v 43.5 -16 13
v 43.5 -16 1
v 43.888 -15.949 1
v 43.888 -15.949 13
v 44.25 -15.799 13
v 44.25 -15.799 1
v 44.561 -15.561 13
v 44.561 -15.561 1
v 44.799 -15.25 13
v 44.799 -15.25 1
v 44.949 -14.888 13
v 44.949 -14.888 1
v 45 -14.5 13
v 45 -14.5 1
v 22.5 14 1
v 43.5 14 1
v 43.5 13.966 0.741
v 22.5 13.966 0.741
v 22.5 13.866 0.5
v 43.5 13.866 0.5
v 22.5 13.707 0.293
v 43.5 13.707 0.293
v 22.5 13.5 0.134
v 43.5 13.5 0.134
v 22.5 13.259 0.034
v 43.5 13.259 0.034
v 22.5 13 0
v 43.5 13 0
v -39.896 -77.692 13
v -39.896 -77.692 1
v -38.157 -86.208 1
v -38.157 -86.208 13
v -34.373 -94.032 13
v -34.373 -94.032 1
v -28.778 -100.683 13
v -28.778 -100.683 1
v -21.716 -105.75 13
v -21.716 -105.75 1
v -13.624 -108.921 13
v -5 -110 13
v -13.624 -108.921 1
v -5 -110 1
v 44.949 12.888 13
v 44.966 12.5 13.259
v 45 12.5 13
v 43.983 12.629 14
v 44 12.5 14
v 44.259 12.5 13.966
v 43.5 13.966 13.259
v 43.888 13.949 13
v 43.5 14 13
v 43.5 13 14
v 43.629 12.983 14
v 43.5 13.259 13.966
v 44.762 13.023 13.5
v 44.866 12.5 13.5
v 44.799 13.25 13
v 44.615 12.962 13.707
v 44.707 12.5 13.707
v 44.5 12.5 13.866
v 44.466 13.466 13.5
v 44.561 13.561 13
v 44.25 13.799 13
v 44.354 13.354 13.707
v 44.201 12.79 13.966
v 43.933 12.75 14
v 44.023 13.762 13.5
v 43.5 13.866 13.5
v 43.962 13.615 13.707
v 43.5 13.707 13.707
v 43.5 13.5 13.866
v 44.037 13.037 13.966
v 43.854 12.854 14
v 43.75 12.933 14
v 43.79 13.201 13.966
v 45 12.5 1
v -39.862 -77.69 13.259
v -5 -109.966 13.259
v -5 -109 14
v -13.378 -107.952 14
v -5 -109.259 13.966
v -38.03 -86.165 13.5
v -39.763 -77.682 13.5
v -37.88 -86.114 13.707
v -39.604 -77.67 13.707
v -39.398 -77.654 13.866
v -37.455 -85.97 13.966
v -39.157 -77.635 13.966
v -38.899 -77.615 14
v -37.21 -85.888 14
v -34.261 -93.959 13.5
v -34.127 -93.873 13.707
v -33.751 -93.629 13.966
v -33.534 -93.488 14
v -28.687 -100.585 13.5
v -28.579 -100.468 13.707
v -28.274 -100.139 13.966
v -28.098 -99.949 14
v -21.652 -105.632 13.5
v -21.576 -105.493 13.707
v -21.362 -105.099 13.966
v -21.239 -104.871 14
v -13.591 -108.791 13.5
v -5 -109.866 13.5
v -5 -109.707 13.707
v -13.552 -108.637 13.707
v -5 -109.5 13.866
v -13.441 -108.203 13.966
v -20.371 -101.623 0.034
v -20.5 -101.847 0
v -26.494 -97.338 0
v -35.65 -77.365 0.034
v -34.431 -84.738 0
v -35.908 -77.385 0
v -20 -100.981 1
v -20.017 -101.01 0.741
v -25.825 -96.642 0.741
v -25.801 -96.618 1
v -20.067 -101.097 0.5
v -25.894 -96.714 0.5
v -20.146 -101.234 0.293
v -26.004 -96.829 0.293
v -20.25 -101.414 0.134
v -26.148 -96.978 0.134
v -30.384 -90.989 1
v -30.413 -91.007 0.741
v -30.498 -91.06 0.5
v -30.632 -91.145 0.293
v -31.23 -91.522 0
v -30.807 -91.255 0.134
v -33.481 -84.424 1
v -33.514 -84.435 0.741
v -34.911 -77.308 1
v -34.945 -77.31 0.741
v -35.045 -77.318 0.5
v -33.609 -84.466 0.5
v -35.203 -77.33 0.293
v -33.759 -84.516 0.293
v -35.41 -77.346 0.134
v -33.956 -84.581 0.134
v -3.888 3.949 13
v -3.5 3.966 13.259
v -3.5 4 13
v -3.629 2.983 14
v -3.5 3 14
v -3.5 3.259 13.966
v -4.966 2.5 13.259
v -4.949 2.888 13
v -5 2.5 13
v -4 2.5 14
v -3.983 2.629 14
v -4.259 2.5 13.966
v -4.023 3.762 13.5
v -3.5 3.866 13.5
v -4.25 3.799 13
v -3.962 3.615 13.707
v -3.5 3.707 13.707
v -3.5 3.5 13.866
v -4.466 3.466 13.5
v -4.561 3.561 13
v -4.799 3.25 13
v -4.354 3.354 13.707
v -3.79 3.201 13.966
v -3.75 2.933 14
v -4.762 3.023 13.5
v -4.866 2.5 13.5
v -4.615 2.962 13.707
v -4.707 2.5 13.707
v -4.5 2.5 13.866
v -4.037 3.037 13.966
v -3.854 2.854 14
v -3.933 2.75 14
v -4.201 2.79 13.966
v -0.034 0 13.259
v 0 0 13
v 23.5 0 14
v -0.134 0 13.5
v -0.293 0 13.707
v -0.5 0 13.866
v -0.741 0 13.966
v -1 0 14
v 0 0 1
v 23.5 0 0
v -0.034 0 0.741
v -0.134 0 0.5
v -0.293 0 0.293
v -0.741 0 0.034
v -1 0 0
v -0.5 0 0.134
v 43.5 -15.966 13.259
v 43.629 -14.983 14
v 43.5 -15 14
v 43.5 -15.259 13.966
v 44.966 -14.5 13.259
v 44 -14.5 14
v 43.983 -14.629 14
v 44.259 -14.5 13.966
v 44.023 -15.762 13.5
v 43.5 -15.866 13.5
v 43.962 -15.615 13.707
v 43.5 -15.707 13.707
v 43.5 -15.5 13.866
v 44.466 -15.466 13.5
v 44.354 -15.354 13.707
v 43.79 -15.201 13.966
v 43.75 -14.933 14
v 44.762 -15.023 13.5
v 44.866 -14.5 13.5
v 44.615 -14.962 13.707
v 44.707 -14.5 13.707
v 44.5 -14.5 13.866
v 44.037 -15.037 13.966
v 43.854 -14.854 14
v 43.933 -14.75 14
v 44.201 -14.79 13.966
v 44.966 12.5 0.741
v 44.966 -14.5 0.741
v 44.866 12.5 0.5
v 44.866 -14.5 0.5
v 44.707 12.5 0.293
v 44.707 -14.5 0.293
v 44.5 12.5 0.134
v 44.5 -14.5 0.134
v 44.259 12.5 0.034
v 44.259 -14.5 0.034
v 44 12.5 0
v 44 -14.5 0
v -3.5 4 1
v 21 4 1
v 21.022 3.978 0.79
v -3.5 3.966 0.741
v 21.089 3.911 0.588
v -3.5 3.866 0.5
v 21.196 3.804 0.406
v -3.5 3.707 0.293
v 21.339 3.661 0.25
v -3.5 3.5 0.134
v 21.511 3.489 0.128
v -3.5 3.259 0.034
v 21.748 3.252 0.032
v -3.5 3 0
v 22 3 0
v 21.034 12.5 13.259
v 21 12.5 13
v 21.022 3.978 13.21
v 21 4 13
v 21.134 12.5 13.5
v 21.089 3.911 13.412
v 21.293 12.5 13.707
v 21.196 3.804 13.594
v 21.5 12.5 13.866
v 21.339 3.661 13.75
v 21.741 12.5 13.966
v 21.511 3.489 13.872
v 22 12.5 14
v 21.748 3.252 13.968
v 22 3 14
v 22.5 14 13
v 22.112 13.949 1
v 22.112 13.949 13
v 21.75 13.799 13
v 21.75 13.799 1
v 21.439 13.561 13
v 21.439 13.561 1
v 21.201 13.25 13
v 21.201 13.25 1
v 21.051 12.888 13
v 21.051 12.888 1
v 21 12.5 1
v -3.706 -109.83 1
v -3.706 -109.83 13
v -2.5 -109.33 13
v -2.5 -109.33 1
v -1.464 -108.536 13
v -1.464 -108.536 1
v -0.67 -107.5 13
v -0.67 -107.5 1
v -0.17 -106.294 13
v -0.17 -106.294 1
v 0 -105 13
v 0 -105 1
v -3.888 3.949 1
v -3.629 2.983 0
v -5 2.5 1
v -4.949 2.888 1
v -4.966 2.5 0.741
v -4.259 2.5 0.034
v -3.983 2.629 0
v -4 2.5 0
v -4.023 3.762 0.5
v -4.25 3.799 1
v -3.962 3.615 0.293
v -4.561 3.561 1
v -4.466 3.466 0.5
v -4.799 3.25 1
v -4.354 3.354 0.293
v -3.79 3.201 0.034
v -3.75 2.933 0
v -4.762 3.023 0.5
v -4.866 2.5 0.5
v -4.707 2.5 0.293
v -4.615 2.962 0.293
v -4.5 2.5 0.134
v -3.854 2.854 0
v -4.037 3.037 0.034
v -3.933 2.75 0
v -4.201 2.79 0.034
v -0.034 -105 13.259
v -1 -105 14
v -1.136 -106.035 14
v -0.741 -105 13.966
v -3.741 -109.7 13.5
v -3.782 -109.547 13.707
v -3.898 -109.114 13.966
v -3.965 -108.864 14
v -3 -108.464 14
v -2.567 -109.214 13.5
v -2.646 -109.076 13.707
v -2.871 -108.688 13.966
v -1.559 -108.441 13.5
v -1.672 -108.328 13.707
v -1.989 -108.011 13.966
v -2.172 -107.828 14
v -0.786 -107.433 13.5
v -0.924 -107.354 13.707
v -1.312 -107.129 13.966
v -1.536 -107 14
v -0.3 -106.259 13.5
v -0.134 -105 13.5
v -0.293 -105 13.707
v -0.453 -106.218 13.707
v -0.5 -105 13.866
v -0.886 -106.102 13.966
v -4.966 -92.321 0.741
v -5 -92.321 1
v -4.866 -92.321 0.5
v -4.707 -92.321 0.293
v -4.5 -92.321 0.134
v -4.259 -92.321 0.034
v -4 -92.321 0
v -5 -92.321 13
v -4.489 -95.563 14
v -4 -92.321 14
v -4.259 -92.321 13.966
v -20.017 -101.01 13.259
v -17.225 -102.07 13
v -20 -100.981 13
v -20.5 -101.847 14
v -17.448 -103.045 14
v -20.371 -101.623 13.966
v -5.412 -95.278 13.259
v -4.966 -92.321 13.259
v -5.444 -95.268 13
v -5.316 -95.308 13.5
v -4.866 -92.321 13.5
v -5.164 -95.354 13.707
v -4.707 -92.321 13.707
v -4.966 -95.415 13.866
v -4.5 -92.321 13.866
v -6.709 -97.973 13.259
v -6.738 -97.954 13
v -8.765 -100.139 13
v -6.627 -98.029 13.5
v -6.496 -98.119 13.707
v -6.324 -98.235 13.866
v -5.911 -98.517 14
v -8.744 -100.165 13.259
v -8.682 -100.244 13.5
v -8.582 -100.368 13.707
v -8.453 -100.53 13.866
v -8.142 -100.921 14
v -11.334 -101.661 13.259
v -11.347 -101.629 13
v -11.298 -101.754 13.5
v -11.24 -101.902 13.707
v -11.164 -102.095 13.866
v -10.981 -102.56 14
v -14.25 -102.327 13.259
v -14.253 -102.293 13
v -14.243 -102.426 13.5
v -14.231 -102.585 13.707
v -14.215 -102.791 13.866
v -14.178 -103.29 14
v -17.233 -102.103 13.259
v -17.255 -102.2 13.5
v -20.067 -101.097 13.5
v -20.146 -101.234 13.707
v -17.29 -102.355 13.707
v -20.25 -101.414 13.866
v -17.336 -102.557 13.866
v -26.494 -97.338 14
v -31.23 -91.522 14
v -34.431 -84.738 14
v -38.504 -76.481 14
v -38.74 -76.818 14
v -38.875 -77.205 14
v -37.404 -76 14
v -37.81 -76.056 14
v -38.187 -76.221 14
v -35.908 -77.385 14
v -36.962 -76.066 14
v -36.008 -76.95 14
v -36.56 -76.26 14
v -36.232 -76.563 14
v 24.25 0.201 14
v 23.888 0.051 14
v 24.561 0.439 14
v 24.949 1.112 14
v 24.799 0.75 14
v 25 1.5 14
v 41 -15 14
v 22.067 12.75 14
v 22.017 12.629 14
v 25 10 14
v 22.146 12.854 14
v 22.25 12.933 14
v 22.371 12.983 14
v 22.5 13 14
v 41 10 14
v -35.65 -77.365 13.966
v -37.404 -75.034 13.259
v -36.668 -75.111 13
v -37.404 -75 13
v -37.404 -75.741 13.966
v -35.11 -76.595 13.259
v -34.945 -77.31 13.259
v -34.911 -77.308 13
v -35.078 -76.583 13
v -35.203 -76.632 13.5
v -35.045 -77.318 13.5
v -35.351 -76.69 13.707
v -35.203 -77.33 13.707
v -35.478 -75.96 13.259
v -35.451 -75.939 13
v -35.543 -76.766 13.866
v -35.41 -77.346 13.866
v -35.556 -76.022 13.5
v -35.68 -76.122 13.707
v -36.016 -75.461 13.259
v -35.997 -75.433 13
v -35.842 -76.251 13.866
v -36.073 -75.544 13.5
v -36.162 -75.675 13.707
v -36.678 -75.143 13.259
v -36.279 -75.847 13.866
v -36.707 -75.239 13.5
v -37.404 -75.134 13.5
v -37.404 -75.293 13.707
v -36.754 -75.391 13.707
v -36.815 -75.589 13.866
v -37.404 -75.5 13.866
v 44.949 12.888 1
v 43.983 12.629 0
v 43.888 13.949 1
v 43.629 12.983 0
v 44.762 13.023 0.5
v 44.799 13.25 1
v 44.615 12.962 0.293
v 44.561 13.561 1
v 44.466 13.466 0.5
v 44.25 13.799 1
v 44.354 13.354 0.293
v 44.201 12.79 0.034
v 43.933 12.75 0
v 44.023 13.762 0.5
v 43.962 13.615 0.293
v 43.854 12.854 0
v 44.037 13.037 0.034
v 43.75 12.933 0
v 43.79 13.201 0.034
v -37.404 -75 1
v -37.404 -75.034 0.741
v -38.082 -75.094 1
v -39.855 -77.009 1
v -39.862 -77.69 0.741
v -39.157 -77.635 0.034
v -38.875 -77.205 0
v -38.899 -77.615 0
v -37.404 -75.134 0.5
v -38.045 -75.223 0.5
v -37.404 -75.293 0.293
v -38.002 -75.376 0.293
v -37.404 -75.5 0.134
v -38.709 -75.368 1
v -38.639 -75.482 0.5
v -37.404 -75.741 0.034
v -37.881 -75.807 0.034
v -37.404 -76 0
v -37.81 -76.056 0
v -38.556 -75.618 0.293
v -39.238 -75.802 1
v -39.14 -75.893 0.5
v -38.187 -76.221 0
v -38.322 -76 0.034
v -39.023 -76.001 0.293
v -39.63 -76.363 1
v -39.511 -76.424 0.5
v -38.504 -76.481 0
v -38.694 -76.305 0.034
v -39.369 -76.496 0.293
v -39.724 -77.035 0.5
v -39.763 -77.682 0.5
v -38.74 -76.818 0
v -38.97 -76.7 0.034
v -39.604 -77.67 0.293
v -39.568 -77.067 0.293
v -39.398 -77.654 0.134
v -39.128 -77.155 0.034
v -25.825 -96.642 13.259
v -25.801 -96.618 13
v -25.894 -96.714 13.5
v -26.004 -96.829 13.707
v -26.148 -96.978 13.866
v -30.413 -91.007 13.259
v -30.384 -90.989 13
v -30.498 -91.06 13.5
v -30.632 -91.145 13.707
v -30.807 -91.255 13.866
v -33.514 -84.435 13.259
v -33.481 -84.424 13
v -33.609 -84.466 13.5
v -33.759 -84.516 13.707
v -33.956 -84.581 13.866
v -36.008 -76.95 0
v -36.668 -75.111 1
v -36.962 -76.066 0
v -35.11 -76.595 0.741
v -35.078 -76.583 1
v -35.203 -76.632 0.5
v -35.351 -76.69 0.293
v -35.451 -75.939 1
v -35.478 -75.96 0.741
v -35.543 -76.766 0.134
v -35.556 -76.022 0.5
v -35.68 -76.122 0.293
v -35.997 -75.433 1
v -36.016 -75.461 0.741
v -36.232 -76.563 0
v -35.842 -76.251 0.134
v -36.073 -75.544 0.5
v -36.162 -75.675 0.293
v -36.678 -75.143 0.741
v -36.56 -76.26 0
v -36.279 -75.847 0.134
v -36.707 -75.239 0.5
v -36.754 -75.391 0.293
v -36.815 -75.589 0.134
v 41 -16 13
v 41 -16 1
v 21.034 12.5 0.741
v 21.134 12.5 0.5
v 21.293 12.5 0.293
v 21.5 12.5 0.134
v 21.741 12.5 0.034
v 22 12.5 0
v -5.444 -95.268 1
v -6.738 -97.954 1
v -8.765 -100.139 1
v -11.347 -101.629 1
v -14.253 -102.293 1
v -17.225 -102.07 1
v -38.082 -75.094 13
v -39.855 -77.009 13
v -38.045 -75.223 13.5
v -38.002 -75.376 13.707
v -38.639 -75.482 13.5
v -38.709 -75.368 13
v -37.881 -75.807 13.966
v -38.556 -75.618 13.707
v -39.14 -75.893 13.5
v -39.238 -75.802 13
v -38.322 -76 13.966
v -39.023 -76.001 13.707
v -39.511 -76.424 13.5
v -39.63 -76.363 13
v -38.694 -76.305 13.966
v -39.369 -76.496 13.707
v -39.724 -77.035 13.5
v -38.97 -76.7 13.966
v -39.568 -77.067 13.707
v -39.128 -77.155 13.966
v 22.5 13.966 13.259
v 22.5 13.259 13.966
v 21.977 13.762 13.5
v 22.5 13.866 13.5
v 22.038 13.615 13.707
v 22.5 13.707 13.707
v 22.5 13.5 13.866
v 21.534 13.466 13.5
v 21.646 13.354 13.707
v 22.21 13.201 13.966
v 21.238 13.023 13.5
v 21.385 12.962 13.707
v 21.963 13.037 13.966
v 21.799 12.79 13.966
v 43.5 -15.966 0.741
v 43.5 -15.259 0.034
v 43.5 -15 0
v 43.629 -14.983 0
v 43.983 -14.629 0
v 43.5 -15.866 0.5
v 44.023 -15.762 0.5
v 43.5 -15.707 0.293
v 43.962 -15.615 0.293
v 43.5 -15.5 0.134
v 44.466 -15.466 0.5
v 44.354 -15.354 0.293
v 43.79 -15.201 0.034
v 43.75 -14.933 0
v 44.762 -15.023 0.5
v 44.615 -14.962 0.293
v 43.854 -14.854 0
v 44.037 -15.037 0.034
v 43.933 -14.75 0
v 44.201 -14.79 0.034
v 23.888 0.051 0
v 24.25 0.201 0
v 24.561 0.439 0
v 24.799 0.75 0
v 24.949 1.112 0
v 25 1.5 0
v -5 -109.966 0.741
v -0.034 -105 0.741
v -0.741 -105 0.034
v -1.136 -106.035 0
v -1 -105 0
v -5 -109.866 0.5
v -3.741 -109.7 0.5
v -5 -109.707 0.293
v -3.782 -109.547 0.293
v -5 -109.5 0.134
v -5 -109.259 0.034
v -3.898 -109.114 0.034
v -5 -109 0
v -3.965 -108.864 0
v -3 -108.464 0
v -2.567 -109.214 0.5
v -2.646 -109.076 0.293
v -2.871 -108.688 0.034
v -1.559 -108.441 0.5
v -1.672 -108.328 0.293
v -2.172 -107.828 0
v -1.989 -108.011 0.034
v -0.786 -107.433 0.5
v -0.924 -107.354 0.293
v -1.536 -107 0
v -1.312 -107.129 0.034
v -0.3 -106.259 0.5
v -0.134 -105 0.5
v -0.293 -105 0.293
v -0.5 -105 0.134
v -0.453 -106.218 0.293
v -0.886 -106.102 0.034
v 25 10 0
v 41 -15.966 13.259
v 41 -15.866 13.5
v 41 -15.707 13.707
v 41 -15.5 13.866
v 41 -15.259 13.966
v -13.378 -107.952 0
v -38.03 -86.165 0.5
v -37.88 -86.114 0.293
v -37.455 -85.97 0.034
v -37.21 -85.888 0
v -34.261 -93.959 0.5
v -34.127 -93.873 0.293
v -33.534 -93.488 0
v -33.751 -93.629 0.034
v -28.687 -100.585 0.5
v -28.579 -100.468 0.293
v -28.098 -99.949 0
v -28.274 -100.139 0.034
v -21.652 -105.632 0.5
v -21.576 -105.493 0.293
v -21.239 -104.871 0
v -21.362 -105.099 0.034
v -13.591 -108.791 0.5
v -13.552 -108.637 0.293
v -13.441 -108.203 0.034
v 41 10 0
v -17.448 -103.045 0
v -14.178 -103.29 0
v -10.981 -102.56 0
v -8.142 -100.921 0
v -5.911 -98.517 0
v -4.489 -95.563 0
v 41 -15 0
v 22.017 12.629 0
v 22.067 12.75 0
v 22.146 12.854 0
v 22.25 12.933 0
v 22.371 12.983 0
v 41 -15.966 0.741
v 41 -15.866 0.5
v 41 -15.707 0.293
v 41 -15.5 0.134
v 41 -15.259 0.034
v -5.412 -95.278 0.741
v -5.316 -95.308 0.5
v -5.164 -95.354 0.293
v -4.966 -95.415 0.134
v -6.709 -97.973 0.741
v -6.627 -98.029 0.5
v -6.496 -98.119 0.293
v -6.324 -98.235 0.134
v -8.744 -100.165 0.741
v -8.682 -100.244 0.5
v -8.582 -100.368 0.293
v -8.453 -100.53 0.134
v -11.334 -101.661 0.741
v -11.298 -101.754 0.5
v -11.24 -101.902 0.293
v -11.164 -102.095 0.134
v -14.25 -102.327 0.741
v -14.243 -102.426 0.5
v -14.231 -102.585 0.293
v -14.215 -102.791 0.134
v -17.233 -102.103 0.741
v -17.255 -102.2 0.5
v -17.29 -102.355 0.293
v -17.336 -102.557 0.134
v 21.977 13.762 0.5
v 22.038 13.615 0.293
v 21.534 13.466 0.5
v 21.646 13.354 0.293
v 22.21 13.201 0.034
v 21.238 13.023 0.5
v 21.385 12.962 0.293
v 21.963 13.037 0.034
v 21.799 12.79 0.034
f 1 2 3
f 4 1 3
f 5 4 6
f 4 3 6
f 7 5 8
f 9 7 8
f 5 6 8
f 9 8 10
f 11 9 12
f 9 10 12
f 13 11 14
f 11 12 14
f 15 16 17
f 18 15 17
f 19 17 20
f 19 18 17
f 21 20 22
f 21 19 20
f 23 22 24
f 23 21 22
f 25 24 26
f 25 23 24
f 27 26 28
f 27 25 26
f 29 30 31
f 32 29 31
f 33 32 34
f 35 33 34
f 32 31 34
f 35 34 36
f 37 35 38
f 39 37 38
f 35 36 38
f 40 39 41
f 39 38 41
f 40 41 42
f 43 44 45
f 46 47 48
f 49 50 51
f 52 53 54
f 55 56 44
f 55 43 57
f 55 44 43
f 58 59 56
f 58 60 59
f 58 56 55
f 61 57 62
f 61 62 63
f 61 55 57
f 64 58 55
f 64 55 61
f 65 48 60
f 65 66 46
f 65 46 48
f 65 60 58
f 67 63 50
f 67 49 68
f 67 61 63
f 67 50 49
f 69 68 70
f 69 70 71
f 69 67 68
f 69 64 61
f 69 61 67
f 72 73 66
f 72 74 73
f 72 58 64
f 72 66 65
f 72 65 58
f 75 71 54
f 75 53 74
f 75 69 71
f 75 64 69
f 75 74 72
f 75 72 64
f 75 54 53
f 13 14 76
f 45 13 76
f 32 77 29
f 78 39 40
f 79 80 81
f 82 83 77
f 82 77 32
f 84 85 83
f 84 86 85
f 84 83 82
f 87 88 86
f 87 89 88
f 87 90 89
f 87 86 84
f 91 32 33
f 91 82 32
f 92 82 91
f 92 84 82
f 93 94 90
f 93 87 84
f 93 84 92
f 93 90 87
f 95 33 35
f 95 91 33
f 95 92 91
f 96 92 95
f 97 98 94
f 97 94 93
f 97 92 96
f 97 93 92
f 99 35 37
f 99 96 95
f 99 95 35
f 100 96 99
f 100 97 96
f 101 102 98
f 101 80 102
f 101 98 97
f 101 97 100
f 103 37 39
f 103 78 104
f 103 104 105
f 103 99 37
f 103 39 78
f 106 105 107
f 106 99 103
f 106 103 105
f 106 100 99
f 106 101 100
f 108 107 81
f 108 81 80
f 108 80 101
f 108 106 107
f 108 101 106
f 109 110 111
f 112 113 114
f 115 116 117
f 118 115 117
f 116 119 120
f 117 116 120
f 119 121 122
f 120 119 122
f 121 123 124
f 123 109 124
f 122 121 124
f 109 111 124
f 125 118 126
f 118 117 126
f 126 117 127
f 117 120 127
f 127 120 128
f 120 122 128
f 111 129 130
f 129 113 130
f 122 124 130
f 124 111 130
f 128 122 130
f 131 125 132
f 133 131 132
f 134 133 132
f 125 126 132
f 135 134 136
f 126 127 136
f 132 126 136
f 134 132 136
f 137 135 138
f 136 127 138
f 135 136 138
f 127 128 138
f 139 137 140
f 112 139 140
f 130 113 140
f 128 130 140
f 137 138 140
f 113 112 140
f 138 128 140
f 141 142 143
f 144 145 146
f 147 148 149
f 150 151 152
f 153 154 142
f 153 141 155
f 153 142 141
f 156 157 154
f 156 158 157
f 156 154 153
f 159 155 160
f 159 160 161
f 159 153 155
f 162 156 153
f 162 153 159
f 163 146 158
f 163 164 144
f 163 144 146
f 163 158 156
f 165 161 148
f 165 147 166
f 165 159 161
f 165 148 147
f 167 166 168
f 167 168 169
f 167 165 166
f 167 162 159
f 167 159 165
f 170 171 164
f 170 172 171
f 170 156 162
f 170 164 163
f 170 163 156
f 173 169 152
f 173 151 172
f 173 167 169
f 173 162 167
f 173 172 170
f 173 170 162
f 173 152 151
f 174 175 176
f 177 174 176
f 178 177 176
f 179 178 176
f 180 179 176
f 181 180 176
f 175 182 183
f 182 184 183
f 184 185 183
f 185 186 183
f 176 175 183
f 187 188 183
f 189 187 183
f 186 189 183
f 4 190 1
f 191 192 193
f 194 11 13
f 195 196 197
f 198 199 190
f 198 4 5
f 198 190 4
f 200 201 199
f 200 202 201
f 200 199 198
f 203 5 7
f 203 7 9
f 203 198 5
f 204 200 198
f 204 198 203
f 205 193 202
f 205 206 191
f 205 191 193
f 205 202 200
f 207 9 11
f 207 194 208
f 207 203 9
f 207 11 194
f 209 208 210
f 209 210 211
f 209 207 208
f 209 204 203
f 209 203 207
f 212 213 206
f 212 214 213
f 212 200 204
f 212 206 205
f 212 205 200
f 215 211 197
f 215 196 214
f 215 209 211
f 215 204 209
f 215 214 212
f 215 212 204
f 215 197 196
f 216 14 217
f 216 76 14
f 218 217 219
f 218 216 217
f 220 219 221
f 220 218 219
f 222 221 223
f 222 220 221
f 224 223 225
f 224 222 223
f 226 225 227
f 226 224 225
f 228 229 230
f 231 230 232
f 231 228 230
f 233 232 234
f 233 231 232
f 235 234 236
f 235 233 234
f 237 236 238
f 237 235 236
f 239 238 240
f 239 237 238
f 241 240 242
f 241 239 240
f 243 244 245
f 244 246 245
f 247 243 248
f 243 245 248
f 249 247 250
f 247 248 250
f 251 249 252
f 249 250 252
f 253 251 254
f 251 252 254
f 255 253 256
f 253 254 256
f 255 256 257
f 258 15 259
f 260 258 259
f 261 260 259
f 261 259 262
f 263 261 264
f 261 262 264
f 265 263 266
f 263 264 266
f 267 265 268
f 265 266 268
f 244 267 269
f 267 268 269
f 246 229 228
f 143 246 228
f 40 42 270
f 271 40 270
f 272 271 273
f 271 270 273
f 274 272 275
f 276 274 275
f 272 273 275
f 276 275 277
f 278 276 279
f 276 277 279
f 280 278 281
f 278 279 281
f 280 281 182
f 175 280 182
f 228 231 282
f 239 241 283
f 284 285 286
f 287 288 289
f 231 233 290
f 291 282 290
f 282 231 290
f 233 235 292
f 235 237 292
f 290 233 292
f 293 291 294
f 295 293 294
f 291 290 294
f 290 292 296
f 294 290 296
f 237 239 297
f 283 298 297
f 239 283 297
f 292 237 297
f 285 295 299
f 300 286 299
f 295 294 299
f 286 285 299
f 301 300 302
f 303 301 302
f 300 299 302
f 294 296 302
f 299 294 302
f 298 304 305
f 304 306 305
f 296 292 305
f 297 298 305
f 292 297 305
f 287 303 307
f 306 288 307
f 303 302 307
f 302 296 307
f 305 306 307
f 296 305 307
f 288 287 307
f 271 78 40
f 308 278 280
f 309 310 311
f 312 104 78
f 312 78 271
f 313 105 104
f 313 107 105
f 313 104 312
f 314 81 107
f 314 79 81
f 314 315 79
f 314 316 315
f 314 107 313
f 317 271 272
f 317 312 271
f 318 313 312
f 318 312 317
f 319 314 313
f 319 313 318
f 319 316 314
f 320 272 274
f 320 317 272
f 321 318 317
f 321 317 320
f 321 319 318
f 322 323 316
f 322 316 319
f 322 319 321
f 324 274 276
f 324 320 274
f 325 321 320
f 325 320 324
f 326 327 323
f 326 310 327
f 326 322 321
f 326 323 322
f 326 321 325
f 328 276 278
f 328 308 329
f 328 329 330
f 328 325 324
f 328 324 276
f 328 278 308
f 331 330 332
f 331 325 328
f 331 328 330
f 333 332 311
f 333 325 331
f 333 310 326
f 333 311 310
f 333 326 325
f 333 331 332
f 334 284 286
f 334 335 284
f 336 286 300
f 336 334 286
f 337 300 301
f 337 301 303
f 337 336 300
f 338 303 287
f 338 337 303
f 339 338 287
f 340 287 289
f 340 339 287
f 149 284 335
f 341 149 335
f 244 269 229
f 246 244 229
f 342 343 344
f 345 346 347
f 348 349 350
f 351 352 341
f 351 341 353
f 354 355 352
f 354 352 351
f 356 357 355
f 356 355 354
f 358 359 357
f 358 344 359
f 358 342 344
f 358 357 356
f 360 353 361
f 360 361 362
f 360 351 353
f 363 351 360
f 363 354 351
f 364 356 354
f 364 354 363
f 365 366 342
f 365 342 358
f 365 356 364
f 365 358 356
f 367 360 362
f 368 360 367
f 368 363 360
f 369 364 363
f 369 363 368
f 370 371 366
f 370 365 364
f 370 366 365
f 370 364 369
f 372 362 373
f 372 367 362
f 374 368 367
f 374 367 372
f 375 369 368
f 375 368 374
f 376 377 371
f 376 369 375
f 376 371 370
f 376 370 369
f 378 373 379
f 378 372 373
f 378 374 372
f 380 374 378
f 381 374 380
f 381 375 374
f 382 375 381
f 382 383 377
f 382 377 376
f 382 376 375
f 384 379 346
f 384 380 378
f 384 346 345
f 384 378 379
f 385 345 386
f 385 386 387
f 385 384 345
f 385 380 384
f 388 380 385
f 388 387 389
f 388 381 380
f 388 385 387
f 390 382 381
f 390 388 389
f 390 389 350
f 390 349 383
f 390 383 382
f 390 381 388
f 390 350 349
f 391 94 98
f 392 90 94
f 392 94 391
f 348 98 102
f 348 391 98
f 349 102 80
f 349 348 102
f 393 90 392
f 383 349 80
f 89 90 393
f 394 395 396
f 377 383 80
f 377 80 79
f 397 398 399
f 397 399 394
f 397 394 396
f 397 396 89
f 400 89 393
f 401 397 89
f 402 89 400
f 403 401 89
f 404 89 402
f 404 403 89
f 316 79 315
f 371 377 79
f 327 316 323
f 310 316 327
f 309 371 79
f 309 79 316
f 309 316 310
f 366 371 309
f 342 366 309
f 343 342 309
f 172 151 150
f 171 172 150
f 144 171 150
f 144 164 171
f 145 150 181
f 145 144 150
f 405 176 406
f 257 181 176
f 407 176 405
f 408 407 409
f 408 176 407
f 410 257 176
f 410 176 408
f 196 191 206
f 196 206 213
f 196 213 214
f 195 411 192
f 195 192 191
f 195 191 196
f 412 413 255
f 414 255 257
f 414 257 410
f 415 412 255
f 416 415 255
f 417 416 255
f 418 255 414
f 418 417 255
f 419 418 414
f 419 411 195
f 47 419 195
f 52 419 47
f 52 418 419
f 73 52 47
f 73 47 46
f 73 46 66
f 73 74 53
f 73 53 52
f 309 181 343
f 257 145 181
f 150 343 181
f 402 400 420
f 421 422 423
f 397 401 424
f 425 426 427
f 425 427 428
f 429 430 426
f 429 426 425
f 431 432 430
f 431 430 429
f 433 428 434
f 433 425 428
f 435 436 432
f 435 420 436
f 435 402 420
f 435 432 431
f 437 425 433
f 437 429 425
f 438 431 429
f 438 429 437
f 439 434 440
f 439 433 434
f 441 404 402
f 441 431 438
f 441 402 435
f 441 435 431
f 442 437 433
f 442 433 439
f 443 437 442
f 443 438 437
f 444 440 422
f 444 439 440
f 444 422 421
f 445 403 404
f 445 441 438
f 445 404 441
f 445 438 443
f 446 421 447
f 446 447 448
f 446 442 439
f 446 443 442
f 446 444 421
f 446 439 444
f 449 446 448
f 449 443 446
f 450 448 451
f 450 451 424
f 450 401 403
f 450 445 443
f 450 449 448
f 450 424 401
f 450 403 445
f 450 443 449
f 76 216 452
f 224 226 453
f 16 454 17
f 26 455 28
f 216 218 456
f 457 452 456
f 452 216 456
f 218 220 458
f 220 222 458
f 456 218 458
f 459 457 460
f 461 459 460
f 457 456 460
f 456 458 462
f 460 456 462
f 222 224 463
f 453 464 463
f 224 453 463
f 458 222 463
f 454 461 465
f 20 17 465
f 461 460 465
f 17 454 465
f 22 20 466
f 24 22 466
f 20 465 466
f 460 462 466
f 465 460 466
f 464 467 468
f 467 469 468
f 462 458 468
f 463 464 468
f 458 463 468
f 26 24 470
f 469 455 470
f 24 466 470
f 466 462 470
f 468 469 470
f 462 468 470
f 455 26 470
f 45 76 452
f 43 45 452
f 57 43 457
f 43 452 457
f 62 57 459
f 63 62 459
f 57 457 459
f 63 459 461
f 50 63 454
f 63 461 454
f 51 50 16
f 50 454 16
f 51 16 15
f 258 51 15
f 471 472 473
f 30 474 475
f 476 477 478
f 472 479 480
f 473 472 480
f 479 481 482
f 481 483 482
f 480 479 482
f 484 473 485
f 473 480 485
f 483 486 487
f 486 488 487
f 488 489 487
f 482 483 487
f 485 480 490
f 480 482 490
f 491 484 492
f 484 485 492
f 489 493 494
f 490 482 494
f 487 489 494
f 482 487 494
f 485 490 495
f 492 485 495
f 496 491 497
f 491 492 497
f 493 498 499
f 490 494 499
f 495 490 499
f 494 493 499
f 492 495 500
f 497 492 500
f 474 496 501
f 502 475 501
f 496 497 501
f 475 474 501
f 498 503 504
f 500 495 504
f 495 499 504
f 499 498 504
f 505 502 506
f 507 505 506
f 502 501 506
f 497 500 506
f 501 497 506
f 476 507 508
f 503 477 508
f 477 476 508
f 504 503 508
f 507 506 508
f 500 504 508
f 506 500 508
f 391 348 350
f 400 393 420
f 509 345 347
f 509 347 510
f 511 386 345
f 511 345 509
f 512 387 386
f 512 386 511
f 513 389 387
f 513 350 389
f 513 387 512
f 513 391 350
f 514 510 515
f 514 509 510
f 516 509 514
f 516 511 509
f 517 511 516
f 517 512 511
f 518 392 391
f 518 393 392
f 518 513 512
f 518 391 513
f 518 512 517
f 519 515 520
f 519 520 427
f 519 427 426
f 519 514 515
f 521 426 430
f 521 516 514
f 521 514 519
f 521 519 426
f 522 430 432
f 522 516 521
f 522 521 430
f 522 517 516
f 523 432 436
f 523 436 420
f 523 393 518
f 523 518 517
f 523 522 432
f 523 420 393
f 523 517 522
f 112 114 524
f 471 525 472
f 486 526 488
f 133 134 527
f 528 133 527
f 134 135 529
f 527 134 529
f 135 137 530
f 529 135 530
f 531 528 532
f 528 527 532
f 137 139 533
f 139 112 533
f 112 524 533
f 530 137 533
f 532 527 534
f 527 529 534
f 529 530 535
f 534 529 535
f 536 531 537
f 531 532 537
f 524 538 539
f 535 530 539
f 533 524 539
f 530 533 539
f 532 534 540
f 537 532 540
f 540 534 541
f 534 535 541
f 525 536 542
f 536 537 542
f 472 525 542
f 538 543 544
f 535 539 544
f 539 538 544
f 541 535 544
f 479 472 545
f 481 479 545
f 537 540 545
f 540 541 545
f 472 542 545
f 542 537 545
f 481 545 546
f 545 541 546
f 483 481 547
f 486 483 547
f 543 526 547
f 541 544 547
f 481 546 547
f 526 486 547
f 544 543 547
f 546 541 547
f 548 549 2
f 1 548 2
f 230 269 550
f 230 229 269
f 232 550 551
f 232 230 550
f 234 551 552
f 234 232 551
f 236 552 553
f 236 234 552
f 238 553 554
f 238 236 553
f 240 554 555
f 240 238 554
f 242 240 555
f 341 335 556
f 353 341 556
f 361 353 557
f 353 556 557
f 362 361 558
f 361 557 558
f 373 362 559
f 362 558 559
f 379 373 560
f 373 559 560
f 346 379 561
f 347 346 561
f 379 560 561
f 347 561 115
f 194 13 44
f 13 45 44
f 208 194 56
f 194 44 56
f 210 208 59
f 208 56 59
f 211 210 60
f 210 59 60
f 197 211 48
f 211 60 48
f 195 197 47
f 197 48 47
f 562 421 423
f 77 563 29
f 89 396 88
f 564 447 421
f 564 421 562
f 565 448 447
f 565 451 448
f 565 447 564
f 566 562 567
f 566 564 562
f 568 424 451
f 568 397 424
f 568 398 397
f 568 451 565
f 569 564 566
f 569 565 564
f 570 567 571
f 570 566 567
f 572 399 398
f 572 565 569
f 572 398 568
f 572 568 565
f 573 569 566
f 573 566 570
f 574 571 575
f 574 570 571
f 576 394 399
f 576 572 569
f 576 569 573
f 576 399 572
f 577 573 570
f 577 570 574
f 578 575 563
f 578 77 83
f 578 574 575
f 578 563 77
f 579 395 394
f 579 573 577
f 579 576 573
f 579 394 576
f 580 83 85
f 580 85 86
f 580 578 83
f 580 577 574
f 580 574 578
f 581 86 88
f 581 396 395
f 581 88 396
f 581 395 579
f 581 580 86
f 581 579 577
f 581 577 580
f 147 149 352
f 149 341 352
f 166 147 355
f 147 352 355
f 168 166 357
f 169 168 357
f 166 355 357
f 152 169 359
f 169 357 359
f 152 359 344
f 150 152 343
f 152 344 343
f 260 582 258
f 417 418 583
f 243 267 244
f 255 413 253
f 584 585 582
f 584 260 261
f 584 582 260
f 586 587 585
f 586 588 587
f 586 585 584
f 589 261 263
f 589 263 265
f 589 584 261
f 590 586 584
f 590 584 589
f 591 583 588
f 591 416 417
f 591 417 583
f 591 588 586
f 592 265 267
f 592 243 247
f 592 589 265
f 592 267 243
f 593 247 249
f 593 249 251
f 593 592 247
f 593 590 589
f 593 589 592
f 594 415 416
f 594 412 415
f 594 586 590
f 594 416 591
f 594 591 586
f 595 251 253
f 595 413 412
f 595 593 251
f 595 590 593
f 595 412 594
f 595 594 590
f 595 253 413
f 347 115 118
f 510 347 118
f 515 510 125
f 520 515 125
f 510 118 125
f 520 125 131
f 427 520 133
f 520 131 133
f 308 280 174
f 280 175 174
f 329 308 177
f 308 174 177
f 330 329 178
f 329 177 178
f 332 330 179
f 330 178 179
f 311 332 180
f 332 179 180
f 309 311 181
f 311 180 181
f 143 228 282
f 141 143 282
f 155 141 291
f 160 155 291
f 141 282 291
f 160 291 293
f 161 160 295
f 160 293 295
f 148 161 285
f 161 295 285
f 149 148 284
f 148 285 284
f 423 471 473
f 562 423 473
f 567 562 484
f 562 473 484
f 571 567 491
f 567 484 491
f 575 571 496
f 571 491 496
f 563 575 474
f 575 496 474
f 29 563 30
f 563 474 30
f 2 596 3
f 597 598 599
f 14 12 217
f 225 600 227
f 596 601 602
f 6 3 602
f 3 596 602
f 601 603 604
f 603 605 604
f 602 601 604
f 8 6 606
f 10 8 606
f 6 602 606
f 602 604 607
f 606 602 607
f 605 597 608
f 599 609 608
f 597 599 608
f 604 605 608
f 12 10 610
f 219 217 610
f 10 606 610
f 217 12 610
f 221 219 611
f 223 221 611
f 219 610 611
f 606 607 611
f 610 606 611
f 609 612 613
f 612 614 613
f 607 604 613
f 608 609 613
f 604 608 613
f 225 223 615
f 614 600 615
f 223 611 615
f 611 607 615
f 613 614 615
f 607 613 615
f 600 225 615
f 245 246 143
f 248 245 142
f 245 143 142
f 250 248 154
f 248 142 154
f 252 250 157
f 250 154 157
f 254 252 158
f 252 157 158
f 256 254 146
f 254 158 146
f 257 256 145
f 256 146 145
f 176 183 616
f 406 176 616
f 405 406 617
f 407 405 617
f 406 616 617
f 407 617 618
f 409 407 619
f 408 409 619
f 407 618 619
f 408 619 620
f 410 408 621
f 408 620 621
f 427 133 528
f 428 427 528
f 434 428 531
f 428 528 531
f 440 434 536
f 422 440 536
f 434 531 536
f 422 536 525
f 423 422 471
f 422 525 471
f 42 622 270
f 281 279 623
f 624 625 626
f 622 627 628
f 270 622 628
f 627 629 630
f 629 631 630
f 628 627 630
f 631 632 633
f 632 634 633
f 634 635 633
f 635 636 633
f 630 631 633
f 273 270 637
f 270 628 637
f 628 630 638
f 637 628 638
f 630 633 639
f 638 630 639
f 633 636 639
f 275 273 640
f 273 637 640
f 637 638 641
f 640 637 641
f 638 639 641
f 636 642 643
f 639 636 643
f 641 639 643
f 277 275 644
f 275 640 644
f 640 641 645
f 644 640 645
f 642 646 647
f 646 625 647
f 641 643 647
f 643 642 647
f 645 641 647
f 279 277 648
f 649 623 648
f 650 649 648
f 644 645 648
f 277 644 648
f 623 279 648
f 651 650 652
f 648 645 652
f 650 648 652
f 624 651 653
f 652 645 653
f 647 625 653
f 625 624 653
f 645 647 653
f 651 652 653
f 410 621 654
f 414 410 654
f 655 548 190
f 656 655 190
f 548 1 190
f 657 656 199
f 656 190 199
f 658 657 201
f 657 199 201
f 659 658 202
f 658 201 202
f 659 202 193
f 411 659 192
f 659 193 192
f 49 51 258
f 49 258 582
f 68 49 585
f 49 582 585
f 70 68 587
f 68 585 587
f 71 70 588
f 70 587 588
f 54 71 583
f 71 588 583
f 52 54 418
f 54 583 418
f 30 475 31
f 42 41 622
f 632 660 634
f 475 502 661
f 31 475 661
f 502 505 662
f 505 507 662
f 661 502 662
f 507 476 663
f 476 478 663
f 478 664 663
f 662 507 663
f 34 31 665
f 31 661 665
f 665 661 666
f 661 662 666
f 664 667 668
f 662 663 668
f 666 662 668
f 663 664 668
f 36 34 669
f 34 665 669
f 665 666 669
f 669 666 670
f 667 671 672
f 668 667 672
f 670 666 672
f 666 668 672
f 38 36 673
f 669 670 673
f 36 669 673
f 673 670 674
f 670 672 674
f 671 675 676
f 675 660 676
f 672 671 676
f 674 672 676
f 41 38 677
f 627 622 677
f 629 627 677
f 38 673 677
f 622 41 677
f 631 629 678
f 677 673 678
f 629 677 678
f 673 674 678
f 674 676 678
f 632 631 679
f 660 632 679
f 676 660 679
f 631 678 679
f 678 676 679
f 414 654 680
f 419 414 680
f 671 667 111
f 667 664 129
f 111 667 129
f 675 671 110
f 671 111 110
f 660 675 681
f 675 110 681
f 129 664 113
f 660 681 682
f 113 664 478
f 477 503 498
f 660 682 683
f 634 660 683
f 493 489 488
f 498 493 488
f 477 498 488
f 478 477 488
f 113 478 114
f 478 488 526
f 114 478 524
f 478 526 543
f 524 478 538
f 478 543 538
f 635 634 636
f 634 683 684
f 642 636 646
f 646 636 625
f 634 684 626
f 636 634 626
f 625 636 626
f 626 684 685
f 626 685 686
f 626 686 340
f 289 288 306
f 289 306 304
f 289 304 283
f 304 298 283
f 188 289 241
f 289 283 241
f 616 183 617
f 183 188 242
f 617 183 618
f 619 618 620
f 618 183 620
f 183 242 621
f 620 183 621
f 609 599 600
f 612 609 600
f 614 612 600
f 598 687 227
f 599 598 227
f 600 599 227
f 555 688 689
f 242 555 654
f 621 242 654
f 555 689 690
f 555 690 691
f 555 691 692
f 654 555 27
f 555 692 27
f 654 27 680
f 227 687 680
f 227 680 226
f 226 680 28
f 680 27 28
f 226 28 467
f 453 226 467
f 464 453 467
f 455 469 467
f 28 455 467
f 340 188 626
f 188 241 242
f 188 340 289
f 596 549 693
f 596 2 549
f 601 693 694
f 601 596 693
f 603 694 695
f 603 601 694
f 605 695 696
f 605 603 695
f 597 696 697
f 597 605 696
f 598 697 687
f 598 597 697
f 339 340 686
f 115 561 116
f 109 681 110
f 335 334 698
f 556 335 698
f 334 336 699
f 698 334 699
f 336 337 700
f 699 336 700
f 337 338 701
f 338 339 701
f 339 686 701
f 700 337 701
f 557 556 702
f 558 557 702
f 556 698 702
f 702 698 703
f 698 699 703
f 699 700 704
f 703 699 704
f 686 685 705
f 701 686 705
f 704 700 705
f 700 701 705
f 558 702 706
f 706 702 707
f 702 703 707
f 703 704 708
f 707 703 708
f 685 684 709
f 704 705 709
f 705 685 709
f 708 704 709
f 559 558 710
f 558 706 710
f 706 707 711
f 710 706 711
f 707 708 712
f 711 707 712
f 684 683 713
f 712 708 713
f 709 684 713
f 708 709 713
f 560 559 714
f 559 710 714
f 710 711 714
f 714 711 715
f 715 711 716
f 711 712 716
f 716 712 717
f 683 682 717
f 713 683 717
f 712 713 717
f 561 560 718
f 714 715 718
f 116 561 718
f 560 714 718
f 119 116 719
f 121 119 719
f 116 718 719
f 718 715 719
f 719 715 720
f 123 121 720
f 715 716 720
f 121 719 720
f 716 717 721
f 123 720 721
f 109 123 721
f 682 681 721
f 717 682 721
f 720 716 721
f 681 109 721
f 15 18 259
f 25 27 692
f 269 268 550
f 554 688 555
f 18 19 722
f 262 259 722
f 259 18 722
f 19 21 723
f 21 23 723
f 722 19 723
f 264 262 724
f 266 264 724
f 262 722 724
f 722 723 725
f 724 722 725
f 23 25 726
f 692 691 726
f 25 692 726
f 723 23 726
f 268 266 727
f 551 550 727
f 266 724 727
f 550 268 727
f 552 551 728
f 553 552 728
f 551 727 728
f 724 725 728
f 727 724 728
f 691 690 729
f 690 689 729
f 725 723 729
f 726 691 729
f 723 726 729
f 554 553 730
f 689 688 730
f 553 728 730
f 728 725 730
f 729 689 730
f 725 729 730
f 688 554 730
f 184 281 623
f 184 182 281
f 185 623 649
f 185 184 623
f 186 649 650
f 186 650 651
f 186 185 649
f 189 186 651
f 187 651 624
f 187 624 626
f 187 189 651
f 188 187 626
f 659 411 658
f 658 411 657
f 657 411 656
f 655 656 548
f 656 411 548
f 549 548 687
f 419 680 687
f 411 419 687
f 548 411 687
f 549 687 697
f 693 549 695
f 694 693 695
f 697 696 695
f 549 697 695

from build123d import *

# Parameters (mm, degrees)
F1_DEPTH = 14
F2_R     = 1


with BuildPart() as f1:
    # F0 (on Top) → F1 (new body)
    with BuildSketch(Plane.XY):
        with BuildLine():
            ThreePointArc((43.5, -16), (44.56066, -15.56066), (45, -14.5))
            Line((45, -14.5), (45, 12.5))
            ThreePointArc((45, 12.5), (44.56066, 13.56066), (43.5, 14))
            Line((43.5, 14), (22.5, 14))
            ThreePointArc((22.5, 14), (21.43934, 13.56066), (21, 12.5))
            Line((21, 12.5), (21, 4))
            Line((21, 4), (-3.5, 4))
            ThreePointArc((-3.5, 4), (-4.56066, 3.56066), (-5, 2.5))
            Line((-5, 2.5), (-5, -92.320508))
            ThreePointArc((-5, -92.320508), (-10, -100.980762), (-20, -100.980762))
            ThreePointArc((-20, -100.980762), (-30.384159, -90.988886), (-34.911111, -77.307692))
            ThreePointArc((-34.911111, -77.307692), (-35.705288, -75.665502), (-37.403703, -75))
            ThreePointArc((-37.403703, -75), (-39.238202, -75.801584), (-39.896296, -77.692308))
            ThreePointArc((-39.896296, -77.692308), (-28.777818, -100.682978), (-5, -110))
            ThreePointArc((-5, -110), (-1.464466, -108.535534), (0, -105))
            Line((0, -105), (0, 0))
            Line((0, 0), (23.5, 0))
            ThreePointArc((23.5, 0), (24.56066, 0.43934), (25, 1.5))
            Line((25, 1.5), (25, 10))
            Line((25, 10), (41, 10))
            Line((41, 10), (41, -16))
            Line((41, -16), (43.5, -16))
        make_face()
    extrude(amount=F1_DEPTH)

    # F2
    f2_edges = [f1.edges().sort_by_distance(p)[0] for p in [
        (45, -1, 14),
        (44.56066, 13.56066, 14),
        (33, 14, 14),
        (8.75, 4, 14),
        (-5, -44.910254, 0),
        (21, 8.25, 0),
    ]]
    fillet(f2_edges, radius=F2_R)


solid = f1.part
